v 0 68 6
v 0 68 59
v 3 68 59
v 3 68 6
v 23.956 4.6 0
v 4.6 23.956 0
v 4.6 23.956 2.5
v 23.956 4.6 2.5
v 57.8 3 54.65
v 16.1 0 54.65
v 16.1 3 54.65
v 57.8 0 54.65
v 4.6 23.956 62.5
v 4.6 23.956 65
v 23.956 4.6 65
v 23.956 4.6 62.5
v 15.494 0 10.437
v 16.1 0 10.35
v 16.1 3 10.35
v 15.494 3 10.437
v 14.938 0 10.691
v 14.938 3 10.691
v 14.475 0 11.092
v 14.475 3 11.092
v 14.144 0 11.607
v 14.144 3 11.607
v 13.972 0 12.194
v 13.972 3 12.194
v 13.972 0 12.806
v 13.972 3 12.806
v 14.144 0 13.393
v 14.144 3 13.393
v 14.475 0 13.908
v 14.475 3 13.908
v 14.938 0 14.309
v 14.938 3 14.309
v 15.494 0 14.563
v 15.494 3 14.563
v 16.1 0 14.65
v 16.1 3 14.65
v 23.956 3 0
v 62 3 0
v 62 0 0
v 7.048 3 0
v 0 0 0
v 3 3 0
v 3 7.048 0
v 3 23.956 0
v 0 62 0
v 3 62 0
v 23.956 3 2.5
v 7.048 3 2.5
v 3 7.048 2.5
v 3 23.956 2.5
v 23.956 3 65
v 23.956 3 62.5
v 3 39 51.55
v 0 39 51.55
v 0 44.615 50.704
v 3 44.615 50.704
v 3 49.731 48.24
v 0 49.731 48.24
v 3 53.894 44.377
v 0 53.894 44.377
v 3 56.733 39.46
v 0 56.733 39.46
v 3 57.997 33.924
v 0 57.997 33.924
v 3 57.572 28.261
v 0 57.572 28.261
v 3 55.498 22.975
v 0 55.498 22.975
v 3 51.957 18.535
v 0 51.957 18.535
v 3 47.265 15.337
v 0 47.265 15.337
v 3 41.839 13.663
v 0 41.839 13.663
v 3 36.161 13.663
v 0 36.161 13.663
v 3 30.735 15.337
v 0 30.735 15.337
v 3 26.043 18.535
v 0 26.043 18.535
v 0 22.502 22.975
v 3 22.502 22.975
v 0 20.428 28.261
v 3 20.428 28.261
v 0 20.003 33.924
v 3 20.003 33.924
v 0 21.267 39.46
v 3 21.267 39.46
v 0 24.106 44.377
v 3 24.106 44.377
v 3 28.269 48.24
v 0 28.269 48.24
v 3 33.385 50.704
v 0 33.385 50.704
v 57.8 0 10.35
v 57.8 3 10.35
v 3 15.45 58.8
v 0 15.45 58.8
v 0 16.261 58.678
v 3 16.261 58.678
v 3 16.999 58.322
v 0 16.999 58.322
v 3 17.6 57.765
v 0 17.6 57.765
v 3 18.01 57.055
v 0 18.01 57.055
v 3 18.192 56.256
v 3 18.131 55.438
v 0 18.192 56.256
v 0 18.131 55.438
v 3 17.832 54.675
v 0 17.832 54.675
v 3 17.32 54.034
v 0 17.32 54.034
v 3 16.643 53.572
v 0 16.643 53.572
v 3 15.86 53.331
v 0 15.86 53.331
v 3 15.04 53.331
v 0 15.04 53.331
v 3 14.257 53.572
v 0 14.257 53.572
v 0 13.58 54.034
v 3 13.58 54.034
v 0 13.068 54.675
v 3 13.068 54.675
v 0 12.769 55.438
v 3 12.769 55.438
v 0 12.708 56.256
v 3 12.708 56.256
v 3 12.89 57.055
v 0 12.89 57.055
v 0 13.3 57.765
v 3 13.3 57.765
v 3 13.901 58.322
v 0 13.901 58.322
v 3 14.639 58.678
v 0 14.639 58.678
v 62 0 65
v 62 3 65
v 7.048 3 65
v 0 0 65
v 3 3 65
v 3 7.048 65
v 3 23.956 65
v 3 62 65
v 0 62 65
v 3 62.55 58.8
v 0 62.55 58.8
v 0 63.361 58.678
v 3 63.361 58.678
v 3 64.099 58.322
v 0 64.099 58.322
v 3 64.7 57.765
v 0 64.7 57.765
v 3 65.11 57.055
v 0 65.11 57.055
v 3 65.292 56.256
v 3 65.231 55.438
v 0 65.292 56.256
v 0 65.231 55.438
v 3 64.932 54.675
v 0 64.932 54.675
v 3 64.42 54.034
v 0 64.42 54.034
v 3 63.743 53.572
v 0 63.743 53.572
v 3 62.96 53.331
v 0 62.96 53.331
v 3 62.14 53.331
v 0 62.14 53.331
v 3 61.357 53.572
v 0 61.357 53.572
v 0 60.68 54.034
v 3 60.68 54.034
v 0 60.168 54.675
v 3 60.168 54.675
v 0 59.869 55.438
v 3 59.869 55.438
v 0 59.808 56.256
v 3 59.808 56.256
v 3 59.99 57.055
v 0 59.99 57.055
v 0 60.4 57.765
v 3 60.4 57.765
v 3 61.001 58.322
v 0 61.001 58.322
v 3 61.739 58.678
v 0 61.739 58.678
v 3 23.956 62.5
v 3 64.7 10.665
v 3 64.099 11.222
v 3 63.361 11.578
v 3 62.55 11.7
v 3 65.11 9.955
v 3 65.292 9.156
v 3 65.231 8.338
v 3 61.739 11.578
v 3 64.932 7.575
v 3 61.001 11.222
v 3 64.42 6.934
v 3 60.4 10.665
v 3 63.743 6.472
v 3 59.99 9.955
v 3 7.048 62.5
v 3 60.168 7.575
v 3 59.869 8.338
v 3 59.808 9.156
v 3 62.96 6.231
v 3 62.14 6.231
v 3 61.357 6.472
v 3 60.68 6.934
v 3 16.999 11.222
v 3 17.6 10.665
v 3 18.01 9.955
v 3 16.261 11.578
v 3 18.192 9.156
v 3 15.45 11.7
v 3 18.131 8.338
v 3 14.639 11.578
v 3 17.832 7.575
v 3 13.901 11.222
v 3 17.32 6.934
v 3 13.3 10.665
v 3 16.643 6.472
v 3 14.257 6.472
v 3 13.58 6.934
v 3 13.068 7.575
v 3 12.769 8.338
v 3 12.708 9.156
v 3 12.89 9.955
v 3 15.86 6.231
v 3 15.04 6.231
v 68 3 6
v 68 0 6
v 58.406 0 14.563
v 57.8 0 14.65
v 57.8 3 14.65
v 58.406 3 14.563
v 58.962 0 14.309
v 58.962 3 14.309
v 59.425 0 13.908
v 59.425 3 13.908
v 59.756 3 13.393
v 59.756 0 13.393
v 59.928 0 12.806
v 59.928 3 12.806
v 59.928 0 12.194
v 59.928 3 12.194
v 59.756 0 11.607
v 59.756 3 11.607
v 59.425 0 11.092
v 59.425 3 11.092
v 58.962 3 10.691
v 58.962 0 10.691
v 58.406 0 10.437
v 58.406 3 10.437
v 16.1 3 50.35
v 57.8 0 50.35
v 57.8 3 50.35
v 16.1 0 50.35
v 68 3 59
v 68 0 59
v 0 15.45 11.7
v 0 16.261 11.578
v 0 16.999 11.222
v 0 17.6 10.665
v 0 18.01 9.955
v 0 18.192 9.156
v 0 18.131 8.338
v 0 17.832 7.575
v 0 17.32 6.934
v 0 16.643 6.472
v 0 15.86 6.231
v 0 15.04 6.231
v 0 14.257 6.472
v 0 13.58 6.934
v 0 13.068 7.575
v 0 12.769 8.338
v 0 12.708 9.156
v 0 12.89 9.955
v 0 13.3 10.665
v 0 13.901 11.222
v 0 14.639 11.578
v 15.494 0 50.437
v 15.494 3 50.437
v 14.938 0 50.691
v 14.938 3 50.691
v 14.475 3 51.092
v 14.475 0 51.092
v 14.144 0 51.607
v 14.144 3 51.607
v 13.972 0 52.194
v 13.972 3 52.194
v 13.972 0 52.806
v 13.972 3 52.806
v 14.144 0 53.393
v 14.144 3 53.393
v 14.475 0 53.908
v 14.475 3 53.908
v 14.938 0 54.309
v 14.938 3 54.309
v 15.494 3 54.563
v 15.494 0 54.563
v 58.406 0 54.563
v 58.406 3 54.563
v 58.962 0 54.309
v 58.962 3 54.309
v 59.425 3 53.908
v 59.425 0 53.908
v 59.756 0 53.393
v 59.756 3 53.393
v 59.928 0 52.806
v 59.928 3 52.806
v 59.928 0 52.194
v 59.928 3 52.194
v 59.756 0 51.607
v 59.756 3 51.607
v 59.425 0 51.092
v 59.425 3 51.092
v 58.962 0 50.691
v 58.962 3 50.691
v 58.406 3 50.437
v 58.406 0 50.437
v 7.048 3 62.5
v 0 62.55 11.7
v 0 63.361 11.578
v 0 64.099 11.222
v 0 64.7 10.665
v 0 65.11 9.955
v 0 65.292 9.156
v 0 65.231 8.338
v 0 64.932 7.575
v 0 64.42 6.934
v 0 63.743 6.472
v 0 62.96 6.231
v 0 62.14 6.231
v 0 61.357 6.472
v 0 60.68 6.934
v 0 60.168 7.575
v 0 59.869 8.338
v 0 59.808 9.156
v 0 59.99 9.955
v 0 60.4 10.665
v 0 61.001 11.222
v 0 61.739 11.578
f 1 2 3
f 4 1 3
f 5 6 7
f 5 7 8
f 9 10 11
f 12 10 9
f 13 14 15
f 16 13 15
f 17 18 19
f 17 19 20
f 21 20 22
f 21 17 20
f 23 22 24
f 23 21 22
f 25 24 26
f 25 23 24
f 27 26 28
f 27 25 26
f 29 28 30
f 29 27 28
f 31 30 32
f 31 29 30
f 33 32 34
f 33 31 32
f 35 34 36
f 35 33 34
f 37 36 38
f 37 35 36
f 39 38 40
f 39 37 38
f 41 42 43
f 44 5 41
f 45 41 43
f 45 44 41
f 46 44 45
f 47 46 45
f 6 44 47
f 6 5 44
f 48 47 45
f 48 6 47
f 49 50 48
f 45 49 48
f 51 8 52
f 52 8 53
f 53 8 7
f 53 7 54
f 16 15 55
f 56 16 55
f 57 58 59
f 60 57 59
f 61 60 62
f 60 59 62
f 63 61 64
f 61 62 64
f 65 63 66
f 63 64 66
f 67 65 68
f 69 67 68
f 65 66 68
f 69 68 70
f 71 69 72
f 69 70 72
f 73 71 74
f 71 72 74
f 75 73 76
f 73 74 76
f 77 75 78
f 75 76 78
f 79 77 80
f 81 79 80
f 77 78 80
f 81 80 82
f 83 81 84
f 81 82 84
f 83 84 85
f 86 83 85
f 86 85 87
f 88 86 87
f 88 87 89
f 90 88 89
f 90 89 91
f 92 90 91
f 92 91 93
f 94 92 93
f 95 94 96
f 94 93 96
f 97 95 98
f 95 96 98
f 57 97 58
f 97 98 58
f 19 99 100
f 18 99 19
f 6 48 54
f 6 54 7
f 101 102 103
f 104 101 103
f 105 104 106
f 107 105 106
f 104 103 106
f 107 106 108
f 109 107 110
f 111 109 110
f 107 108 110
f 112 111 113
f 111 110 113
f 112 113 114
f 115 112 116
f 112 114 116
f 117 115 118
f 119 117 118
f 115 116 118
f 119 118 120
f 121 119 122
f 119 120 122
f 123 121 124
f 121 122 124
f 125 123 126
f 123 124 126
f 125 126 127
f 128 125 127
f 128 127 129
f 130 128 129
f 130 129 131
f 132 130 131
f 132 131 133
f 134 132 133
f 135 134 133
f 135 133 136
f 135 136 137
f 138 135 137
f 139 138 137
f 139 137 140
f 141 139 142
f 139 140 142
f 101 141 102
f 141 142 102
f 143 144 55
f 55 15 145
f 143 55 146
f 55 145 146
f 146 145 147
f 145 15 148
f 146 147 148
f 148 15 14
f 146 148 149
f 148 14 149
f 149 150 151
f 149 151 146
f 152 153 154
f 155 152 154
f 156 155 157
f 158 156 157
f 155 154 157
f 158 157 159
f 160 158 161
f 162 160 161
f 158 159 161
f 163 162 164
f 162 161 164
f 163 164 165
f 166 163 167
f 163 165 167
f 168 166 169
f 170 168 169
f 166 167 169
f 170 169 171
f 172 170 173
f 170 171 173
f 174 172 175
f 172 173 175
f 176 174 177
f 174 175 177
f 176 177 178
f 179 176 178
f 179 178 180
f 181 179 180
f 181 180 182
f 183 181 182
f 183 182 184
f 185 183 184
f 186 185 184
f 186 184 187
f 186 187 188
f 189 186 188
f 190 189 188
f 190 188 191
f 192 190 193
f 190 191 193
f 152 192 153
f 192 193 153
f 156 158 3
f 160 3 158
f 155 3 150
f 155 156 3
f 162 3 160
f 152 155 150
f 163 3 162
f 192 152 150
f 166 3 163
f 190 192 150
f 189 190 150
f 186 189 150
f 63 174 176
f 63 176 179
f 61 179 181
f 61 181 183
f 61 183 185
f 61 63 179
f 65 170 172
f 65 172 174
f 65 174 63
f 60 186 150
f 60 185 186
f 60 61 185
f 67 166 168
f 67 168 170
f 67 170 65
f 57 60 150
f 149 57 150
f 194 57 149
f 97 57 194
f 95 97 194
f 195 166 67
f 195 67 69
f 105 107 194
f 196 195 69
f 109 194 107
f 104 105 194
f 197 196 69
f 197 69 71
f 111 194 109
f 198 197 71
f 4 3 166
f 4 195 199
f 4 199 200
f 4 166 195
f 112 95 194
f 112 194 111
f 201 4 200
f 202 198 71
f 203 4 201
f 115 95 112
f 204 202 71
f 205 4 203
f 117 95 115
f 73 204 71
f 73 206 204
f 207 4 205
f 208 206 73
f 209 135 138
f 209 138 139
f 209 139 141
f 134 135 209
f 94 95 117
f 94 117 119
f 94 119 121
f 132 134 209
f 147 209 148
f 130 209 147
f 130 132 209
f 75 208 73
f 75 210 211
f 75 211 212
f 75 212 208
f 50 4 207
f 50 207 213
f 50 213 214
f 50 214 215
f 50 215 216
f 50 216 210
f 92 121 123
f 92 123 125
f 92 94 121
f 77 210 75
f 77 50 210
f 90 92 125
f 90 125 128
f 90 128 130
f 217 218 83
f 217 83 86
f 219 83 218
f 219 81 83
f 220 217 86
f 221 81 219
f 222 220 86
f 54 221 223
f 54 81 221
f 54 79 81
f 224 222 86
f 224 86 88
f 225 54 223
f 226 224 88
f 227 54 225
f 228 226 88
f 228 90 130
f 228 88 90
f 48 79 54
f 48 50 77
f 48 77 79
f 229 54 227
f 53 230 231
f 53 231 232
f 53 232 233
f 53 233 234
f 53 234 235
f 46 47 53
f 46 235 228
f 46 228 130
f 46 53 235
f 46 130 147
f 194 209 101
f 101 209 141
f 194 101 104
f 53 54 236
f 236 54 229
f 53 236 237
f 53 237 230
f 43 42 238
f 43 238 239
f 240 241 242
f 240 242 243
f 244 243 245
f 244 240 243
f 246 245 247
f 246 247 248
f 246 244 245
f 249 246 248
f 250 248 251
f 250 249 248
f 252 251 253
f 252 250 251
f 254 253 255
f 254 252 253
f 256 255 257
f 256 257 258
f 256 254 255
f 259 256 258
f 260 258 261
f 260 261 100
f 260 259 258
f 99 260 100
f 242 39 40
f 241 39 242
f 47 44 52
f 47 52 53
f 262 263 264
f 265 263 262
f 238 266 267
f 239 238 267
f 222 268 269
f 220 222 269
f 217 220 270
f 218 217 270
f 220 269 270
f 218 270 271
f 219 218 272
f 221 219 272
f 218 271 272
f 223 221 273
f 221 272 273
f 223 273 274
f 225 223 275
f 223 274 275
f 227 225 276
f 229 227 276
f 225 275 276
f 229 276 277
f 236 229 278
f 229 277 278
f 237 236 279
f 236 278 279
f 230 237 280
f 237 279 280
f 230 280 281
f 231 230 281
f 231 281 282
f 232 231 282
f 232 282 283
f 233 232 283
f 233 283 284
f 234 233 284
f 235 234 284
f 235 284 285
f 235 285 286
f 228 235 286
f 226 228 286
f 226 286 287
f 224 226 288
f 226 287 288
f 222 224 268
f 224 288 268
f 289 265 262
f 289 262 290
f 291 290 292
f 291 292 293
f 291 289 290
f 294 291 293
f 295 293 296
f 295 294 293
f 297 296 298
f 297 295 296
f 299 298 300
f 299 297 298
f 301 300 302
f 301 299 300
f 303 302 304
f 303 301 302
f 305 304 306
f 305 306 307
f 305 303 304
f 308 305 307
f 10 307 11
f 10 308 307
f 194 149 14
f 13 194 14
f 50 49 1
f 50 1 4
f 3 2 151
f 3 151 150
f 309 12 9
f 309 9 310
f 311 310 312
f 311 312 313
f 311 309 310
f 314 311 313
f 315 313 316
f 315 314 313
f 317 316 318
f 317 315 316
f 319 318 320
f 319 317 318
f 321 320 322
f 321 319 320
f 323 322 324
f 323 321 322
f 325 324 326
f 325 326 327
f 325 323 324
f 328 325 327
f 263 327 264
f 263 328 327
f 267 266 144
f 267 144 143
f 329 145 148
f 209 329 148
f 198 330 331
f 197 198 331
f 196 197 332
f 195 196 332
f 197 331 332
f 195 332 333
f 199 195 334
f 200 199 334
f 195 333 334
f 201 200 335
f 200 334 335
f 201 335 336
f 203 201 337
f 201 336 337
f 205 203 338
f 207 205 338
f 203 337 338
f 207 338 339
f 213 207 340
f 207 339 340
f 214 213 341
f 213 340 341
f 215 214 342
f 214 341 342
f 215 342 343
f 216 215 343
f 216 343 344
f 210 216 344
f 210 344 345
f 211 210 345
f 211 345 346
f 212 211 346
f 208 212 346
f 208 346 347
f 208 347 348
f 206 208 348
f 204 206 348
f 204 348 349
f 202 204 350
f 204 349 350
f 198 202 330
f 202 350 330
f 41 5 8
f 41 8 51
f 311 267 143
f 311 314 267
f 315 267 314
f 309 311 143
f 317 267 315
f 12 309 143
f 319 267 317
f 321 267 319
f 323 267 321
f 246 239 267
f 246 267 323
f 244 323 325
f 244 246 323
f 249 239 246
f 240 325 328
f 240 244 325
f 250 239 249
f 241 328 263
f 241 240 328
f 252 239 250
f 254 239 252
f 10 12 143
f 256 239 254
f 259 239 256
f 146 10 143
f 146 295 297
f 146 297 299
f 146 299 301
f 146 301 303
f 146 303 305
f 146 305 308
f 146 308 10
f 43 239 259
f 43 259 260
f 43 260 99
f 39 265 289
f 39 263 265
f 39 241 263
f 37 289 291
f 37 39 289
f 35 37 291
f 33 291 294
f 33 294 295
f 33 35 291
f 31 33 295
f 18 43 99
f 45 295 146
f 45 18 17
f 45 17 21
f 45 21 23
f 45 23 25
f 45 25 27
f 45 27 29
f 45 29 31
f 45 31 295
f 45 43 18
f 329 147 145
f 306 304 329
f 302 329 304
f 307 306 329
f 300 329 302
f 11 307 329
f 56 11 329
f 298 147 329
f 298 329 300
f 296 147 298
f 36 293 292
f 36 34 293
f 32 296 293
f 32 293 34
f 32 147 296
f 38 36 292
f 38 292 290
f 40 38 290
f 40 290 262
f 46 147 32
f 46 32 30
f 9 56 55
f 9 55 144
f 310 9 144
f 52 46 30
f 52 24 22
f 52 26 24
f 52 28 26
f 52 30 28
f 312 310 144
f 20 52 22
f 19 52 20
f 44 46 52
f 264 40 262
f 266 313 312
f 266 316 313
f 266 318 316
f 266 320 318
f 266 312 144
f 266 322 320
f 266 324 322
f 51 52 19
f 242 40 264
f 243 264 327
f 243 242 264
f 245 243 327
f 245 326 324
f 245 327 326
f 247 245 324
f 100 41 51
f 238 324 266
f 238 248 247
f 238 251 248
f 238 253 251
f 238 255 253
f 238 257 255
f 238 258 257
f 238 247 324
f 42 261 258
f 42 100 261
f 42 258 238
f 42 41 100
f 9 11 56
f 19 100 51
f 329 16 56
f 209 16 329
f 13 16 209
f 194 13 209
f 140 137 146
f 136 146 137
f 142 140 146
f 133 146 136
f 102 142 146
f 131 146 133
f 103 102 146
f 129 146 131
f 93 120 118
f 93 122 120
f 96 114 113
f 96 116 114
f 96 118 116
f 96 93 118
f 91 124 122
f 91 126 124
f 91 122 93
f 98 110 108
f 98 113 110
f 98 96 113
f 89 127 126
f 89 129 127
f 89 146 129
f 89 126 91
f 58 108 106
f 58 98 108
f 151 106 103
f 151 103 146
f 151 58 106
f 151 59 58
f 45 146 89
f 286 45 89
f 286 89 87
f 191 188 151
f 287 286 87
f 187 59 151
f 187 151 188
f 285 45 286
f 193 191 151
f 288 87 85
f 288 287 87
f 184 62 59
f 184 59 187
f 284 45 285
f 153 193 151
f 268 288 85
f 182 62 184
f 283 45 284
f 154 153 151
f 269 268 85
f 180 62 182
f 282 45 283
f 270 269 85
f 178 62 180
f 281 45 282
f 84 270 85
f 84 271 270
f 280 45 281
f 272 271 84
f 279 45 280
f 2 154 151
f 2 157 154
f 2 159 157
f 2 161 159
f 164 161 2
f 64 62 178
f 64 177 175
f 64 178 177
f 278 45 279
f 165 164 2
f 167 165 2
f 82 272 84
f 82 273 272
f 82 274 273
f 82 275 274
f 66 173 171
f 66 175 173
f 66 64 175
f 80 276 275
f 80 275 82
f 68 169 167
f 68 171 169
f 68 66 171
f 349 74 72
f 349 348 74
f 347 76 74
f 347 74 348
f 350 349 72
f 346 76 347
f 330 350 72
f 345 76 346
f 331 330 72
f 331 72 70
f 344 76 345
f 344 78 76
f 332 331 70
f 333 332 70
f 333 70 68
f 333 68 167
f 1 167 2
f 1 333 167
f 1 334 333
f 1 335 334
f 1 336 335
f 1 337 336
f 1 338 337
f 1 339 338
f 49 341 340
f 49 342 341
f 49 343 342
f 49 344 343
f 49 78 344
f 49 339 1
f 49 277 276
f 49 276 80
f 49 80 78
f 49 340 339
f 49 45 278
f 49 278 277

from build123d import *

# Parameters (mm, degrees)
BOSS_EXTRUDE1_DEPTH = 65
CHAMFER1_SIZE       = 6
BOSS_EXTRUDE2_DEPTH = 2.5
SKETCH3_R           = 19.05
SKETCH3_R_2         = 2.75
CUT_EXTRUDE1_DEPTH  = 3
CUT_EXTRUDE2_DEPTH  = 3


with BuildPart() as part:
    # Sketch1 → Boss-Extrude1 (new body)
    with BuildSketch(Plane.XY):
        Polygon((0, 0), (0, 68), (3, 68), (3, 3), (68, 3), (68, 0), align=None)
    extrude(amount=BOSS_EXTRUDE1_DEPTH)

    # Chamfer1
    chamfer1_edges = [part.edges().sort_by_distance(p)[0] for p in [
        (1.5, 68, 65),
        (1.5, 68, 0),
        (68, 1.5, 65),
        (68, 1.5, 0),
    ]]
    chamfer(chamfer1_edges, length=CHAMFER1_SIZE)

    # Sketch2 → Boss-Extrude2 (add)
    with BuildSketch(Plane.XY.offset(65)):
        Polygon((4.600185007, 23.955878092), (23.955878092, 4.600185007), (23.955878092, 3), (7.047822016, 3), (3, 7.047822016), (3, 23.955878092), align=None)
    boss_extrude2 = extrude(amount=-BOSS_EXTRUDE2_DEPTH)

    # Mirror1: Boss-Extrude2 across plane
    add(boss_extrude2.mirror(Plane.XY.offset(32.5)))

    # Sketch3 → Cut-Extrude1 (cut)
    with BuildSketch(Plane.ZY):
        with Locations((32.5, 39)):
            Circle(SKETCH3_R)
        with Locations((8.95, 62.55)):
            Circle(SKETCH3_R_2)
        with Locations((56.05, 62.55)):
            Circle(SKETCH3_R_2)
        with Locations((8.95, 15.45)):
            Circle(SKETCH3_R_2)
        with Locations((56.05, 15.45)):
            Circle(SKETCH3_R_2)
    extrude(amount=-CUT_EXTRUDE1_DEPTH, mode=Mode.SUBTRACT)

    # Sketch4 → Cut-Extrude2 (cut)
    with BuildSketch(Plane.XZ):
        with BuildLine():
            Line((16.1, 54.65), (57.8, 54.65))
            ThreePointArc((57.8, 54.65), (59.95, 52.5), (57.8, 50.35))
            Line((57.8, 50.35), (16.1, 50.35))
            ThreePointArc((16.1, 50.35), (13.95, 52.5), (16.1, 54.65))
        make_face()
        with BuildLine():
            Line((16.1, 14.65), (57.8, 14.65))
            ThreePointArc((57.8, 14.65), (59.95, 12.5), (57.8, 10.35))
            Line((57.8, 10.35), (16.1, 10.35))
            ThreePointArc((16.1, 10.35), (13.95, 12.5), (16.1, 14.65))
        make_face()
    extrude(amount=-CUT_EXTRUDE2_DEPTH, mode=Mode.SUBTRACT)


solid = part.part
